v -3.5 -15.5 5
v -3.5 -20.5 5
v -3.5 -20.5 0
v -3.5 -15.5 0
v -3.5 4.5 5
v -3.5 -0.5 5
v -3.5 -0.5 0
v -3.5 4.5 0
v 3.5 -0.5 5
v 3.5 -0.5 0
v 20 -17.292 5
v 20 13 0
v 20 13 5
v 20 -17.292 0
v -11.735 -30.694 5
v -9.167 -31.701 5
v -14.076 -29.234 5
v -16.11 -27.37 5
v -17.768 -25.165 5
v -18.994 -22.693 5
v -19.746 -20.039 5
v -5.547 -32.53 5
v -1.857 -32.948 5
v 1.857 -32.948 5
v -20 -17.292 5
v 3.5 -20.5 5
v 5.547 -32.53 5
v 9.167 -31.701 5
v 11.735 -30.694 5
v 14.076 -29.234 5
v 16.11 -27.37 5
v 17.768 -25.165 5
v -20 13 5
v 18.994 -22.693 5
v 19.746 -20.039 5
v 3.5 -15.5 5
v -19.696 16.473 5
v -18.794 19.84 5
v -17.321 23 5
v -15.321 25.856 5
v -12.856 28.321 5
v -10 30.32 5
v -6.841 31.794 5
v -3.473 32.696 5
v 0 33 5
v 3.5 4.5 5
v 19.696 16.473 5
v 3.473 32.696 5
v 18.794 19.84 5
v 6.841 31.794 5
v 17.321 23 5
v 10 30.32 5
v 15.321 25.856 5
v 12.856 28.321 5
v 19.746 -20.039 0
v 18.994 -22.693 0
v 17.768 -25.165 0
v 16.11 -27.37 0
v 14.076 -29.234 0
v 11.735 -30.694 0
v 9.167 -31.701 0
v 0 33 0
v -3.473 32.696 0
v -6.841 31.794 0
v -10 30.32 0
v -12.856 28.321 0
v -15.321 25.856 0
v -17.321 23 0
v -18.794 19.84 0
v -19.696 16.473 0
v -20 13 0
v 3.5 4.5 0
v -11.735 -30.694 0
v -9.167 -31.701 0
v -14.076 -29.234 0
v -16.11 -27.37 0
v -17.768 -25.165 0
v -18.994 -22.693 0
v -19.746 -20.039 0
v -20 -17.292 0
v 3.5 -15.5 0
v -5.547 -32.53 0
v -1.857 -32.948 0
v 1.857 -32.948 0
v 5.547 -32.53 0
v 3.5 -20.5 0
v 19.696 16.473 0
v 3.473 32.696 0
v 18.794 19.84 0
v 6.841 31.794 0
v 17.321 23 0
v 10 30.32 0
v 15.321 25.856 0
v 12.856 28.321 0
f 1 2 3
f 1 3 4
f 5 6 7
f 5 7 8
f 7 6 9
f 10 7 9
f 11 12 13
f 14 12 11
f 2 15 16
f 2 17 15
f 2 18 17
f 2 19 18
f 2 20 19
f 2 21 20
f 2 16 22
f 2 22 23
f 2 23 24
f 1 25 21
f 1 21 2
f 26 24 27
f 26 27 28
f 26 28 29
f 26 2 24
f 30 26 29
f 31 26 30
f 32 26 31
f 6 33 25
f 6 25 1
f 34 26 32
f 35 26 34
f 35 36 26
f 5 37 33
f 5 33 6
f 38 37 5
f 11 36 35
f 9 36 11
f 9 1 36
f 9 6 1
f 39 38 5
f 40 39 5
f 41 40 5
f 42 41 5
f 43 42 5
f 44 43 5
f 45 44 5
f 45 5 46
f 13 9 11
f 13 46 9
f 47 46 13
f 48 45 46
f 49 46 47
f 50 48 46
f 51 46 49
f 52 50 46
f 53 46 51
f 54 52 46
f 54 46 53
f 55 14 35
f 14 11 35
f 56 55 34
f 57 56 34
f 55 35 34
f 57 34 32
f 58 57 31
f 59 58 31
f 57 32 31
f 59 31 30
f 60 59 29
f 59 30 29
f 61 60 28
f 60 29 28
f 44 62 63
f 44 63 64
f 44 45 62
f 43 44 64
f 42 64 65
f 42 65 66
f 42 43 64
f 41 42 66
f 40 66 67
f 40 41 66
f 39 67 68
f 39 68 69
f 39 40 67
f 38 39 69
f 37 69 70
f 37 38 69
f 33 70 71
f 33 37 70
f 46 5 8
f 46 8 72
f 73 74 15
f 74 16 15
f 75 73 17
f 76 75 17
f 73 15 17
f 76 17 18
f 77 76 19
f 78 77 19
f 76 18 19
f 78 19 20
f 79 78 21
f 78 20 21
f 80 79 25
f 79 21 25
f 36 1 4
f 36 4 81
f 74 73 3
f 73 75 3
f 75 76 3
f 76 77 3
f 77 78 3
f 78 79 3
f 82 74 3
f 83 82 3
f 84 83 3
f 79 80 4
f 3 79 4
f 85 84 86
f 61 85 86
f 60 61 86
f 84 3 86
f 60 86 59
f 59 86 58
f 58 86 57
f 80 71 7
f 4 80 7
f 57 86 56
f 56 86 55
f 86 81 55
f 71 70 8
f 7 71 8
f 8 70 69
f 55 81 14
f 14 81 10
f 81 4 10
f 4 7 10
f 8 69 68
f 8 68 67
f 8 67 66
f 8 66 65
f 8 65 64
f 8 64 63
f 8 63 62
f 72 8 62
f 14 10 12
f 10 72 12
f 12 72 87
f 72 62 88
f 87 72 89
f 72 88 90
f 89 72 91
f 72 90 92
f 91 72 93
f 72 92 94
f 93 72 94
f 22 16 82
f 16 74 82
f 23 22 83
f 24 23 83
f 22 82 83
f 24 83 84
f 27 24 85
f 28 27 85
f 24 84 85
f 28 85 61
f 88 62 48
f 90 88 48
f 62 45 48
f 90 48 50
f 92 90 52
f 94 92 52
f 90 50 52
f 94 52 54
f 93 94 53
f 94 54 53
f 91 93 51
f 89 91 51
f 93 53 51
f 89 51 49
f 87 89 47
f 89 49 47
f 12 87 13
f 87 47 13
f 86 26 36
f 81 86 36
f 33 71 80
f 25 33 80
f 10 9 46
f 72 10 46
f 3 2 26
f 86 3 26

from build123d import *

# Parameters (mm, degrees)
SKETCH1_R           = 33
BOSS_EXTRUDE1_DEPTH = 5
CUT_EXTRUDE3_START  = -10
CUT_EXTRUDE3_DEPTH  = 10
FILLET2_R           = 20
FILLET3_R           = 15
SKETCH11_W          = 7
SKETCH11_H          = 5
CUT_EXTRUDE4_DEPTH  = 10


with BuildPart() as part:
    # Sketch1 → Boss-Extrude1 (new body)
    with BuildSketch(Plane.XY):
        Circle(SKETCH1_R)
    extrude(amount=BOSS_EXTRUDE1_DEPTH)

    # Sketch10 → Cut-Extrude3 (cut)
    with BuildSketch(Plane.XY.offset(5).offset(CUT_EXTRUDE3_START)):
        with BuildLine():
            Line((-20, 26.248809497), (-20, -26.248809497))
            ThreePointArc((-20, -26.248809497), (-33, 0), (-20, 26.248809497))
        make_face()
        with BuildLine():
            Line((20, 26.248809497), (20, -26.248809497))
            ThreePointArc((20, -26.248809497), (33, 0), (20, 26.248809497))
        make_face()
    extrude(amount=CUT_EXTRUDE3_DEPTH, mode=Mode.SUBTRACT)

    # Fillet2
    fillet2_edges = [part.edges().sort_by_distance(p)[0] for p in [
        (-20, 26.248809497, 2.5),
        (20, 26.248809497, 2.5),
    ]]
    fillet(fillet2_edges, radius=FILLET2_R - 0.0001)  # a hair under: the kernel refuses the full size

    # Fillet3
    fillet3_edges = [part.edges().sort_by_distance(p)[0] for p in [
        (-20, -26.248809497, 2.5),
        (20, -26.248809497, 2.5),
    ]]
    fillet(fillet3_edges, radius=FILLET3_R)

    # Sketch11 → Cut-Extrude4 (cut)
    with BuildSketch(Plane.XY.offset(5)):
        with Locations((0, 2)):
            Rectangle(SKETCH11_W, SKETCH11_H)
        with Locations((0, -18)):
            Rectangle(SKETCH11_W, SKETCH11_H)
    extrude(amount=-CUT_EXTRUDE4_DEPTH, mode=Mode.SUBTRACT)


solid = part.part
